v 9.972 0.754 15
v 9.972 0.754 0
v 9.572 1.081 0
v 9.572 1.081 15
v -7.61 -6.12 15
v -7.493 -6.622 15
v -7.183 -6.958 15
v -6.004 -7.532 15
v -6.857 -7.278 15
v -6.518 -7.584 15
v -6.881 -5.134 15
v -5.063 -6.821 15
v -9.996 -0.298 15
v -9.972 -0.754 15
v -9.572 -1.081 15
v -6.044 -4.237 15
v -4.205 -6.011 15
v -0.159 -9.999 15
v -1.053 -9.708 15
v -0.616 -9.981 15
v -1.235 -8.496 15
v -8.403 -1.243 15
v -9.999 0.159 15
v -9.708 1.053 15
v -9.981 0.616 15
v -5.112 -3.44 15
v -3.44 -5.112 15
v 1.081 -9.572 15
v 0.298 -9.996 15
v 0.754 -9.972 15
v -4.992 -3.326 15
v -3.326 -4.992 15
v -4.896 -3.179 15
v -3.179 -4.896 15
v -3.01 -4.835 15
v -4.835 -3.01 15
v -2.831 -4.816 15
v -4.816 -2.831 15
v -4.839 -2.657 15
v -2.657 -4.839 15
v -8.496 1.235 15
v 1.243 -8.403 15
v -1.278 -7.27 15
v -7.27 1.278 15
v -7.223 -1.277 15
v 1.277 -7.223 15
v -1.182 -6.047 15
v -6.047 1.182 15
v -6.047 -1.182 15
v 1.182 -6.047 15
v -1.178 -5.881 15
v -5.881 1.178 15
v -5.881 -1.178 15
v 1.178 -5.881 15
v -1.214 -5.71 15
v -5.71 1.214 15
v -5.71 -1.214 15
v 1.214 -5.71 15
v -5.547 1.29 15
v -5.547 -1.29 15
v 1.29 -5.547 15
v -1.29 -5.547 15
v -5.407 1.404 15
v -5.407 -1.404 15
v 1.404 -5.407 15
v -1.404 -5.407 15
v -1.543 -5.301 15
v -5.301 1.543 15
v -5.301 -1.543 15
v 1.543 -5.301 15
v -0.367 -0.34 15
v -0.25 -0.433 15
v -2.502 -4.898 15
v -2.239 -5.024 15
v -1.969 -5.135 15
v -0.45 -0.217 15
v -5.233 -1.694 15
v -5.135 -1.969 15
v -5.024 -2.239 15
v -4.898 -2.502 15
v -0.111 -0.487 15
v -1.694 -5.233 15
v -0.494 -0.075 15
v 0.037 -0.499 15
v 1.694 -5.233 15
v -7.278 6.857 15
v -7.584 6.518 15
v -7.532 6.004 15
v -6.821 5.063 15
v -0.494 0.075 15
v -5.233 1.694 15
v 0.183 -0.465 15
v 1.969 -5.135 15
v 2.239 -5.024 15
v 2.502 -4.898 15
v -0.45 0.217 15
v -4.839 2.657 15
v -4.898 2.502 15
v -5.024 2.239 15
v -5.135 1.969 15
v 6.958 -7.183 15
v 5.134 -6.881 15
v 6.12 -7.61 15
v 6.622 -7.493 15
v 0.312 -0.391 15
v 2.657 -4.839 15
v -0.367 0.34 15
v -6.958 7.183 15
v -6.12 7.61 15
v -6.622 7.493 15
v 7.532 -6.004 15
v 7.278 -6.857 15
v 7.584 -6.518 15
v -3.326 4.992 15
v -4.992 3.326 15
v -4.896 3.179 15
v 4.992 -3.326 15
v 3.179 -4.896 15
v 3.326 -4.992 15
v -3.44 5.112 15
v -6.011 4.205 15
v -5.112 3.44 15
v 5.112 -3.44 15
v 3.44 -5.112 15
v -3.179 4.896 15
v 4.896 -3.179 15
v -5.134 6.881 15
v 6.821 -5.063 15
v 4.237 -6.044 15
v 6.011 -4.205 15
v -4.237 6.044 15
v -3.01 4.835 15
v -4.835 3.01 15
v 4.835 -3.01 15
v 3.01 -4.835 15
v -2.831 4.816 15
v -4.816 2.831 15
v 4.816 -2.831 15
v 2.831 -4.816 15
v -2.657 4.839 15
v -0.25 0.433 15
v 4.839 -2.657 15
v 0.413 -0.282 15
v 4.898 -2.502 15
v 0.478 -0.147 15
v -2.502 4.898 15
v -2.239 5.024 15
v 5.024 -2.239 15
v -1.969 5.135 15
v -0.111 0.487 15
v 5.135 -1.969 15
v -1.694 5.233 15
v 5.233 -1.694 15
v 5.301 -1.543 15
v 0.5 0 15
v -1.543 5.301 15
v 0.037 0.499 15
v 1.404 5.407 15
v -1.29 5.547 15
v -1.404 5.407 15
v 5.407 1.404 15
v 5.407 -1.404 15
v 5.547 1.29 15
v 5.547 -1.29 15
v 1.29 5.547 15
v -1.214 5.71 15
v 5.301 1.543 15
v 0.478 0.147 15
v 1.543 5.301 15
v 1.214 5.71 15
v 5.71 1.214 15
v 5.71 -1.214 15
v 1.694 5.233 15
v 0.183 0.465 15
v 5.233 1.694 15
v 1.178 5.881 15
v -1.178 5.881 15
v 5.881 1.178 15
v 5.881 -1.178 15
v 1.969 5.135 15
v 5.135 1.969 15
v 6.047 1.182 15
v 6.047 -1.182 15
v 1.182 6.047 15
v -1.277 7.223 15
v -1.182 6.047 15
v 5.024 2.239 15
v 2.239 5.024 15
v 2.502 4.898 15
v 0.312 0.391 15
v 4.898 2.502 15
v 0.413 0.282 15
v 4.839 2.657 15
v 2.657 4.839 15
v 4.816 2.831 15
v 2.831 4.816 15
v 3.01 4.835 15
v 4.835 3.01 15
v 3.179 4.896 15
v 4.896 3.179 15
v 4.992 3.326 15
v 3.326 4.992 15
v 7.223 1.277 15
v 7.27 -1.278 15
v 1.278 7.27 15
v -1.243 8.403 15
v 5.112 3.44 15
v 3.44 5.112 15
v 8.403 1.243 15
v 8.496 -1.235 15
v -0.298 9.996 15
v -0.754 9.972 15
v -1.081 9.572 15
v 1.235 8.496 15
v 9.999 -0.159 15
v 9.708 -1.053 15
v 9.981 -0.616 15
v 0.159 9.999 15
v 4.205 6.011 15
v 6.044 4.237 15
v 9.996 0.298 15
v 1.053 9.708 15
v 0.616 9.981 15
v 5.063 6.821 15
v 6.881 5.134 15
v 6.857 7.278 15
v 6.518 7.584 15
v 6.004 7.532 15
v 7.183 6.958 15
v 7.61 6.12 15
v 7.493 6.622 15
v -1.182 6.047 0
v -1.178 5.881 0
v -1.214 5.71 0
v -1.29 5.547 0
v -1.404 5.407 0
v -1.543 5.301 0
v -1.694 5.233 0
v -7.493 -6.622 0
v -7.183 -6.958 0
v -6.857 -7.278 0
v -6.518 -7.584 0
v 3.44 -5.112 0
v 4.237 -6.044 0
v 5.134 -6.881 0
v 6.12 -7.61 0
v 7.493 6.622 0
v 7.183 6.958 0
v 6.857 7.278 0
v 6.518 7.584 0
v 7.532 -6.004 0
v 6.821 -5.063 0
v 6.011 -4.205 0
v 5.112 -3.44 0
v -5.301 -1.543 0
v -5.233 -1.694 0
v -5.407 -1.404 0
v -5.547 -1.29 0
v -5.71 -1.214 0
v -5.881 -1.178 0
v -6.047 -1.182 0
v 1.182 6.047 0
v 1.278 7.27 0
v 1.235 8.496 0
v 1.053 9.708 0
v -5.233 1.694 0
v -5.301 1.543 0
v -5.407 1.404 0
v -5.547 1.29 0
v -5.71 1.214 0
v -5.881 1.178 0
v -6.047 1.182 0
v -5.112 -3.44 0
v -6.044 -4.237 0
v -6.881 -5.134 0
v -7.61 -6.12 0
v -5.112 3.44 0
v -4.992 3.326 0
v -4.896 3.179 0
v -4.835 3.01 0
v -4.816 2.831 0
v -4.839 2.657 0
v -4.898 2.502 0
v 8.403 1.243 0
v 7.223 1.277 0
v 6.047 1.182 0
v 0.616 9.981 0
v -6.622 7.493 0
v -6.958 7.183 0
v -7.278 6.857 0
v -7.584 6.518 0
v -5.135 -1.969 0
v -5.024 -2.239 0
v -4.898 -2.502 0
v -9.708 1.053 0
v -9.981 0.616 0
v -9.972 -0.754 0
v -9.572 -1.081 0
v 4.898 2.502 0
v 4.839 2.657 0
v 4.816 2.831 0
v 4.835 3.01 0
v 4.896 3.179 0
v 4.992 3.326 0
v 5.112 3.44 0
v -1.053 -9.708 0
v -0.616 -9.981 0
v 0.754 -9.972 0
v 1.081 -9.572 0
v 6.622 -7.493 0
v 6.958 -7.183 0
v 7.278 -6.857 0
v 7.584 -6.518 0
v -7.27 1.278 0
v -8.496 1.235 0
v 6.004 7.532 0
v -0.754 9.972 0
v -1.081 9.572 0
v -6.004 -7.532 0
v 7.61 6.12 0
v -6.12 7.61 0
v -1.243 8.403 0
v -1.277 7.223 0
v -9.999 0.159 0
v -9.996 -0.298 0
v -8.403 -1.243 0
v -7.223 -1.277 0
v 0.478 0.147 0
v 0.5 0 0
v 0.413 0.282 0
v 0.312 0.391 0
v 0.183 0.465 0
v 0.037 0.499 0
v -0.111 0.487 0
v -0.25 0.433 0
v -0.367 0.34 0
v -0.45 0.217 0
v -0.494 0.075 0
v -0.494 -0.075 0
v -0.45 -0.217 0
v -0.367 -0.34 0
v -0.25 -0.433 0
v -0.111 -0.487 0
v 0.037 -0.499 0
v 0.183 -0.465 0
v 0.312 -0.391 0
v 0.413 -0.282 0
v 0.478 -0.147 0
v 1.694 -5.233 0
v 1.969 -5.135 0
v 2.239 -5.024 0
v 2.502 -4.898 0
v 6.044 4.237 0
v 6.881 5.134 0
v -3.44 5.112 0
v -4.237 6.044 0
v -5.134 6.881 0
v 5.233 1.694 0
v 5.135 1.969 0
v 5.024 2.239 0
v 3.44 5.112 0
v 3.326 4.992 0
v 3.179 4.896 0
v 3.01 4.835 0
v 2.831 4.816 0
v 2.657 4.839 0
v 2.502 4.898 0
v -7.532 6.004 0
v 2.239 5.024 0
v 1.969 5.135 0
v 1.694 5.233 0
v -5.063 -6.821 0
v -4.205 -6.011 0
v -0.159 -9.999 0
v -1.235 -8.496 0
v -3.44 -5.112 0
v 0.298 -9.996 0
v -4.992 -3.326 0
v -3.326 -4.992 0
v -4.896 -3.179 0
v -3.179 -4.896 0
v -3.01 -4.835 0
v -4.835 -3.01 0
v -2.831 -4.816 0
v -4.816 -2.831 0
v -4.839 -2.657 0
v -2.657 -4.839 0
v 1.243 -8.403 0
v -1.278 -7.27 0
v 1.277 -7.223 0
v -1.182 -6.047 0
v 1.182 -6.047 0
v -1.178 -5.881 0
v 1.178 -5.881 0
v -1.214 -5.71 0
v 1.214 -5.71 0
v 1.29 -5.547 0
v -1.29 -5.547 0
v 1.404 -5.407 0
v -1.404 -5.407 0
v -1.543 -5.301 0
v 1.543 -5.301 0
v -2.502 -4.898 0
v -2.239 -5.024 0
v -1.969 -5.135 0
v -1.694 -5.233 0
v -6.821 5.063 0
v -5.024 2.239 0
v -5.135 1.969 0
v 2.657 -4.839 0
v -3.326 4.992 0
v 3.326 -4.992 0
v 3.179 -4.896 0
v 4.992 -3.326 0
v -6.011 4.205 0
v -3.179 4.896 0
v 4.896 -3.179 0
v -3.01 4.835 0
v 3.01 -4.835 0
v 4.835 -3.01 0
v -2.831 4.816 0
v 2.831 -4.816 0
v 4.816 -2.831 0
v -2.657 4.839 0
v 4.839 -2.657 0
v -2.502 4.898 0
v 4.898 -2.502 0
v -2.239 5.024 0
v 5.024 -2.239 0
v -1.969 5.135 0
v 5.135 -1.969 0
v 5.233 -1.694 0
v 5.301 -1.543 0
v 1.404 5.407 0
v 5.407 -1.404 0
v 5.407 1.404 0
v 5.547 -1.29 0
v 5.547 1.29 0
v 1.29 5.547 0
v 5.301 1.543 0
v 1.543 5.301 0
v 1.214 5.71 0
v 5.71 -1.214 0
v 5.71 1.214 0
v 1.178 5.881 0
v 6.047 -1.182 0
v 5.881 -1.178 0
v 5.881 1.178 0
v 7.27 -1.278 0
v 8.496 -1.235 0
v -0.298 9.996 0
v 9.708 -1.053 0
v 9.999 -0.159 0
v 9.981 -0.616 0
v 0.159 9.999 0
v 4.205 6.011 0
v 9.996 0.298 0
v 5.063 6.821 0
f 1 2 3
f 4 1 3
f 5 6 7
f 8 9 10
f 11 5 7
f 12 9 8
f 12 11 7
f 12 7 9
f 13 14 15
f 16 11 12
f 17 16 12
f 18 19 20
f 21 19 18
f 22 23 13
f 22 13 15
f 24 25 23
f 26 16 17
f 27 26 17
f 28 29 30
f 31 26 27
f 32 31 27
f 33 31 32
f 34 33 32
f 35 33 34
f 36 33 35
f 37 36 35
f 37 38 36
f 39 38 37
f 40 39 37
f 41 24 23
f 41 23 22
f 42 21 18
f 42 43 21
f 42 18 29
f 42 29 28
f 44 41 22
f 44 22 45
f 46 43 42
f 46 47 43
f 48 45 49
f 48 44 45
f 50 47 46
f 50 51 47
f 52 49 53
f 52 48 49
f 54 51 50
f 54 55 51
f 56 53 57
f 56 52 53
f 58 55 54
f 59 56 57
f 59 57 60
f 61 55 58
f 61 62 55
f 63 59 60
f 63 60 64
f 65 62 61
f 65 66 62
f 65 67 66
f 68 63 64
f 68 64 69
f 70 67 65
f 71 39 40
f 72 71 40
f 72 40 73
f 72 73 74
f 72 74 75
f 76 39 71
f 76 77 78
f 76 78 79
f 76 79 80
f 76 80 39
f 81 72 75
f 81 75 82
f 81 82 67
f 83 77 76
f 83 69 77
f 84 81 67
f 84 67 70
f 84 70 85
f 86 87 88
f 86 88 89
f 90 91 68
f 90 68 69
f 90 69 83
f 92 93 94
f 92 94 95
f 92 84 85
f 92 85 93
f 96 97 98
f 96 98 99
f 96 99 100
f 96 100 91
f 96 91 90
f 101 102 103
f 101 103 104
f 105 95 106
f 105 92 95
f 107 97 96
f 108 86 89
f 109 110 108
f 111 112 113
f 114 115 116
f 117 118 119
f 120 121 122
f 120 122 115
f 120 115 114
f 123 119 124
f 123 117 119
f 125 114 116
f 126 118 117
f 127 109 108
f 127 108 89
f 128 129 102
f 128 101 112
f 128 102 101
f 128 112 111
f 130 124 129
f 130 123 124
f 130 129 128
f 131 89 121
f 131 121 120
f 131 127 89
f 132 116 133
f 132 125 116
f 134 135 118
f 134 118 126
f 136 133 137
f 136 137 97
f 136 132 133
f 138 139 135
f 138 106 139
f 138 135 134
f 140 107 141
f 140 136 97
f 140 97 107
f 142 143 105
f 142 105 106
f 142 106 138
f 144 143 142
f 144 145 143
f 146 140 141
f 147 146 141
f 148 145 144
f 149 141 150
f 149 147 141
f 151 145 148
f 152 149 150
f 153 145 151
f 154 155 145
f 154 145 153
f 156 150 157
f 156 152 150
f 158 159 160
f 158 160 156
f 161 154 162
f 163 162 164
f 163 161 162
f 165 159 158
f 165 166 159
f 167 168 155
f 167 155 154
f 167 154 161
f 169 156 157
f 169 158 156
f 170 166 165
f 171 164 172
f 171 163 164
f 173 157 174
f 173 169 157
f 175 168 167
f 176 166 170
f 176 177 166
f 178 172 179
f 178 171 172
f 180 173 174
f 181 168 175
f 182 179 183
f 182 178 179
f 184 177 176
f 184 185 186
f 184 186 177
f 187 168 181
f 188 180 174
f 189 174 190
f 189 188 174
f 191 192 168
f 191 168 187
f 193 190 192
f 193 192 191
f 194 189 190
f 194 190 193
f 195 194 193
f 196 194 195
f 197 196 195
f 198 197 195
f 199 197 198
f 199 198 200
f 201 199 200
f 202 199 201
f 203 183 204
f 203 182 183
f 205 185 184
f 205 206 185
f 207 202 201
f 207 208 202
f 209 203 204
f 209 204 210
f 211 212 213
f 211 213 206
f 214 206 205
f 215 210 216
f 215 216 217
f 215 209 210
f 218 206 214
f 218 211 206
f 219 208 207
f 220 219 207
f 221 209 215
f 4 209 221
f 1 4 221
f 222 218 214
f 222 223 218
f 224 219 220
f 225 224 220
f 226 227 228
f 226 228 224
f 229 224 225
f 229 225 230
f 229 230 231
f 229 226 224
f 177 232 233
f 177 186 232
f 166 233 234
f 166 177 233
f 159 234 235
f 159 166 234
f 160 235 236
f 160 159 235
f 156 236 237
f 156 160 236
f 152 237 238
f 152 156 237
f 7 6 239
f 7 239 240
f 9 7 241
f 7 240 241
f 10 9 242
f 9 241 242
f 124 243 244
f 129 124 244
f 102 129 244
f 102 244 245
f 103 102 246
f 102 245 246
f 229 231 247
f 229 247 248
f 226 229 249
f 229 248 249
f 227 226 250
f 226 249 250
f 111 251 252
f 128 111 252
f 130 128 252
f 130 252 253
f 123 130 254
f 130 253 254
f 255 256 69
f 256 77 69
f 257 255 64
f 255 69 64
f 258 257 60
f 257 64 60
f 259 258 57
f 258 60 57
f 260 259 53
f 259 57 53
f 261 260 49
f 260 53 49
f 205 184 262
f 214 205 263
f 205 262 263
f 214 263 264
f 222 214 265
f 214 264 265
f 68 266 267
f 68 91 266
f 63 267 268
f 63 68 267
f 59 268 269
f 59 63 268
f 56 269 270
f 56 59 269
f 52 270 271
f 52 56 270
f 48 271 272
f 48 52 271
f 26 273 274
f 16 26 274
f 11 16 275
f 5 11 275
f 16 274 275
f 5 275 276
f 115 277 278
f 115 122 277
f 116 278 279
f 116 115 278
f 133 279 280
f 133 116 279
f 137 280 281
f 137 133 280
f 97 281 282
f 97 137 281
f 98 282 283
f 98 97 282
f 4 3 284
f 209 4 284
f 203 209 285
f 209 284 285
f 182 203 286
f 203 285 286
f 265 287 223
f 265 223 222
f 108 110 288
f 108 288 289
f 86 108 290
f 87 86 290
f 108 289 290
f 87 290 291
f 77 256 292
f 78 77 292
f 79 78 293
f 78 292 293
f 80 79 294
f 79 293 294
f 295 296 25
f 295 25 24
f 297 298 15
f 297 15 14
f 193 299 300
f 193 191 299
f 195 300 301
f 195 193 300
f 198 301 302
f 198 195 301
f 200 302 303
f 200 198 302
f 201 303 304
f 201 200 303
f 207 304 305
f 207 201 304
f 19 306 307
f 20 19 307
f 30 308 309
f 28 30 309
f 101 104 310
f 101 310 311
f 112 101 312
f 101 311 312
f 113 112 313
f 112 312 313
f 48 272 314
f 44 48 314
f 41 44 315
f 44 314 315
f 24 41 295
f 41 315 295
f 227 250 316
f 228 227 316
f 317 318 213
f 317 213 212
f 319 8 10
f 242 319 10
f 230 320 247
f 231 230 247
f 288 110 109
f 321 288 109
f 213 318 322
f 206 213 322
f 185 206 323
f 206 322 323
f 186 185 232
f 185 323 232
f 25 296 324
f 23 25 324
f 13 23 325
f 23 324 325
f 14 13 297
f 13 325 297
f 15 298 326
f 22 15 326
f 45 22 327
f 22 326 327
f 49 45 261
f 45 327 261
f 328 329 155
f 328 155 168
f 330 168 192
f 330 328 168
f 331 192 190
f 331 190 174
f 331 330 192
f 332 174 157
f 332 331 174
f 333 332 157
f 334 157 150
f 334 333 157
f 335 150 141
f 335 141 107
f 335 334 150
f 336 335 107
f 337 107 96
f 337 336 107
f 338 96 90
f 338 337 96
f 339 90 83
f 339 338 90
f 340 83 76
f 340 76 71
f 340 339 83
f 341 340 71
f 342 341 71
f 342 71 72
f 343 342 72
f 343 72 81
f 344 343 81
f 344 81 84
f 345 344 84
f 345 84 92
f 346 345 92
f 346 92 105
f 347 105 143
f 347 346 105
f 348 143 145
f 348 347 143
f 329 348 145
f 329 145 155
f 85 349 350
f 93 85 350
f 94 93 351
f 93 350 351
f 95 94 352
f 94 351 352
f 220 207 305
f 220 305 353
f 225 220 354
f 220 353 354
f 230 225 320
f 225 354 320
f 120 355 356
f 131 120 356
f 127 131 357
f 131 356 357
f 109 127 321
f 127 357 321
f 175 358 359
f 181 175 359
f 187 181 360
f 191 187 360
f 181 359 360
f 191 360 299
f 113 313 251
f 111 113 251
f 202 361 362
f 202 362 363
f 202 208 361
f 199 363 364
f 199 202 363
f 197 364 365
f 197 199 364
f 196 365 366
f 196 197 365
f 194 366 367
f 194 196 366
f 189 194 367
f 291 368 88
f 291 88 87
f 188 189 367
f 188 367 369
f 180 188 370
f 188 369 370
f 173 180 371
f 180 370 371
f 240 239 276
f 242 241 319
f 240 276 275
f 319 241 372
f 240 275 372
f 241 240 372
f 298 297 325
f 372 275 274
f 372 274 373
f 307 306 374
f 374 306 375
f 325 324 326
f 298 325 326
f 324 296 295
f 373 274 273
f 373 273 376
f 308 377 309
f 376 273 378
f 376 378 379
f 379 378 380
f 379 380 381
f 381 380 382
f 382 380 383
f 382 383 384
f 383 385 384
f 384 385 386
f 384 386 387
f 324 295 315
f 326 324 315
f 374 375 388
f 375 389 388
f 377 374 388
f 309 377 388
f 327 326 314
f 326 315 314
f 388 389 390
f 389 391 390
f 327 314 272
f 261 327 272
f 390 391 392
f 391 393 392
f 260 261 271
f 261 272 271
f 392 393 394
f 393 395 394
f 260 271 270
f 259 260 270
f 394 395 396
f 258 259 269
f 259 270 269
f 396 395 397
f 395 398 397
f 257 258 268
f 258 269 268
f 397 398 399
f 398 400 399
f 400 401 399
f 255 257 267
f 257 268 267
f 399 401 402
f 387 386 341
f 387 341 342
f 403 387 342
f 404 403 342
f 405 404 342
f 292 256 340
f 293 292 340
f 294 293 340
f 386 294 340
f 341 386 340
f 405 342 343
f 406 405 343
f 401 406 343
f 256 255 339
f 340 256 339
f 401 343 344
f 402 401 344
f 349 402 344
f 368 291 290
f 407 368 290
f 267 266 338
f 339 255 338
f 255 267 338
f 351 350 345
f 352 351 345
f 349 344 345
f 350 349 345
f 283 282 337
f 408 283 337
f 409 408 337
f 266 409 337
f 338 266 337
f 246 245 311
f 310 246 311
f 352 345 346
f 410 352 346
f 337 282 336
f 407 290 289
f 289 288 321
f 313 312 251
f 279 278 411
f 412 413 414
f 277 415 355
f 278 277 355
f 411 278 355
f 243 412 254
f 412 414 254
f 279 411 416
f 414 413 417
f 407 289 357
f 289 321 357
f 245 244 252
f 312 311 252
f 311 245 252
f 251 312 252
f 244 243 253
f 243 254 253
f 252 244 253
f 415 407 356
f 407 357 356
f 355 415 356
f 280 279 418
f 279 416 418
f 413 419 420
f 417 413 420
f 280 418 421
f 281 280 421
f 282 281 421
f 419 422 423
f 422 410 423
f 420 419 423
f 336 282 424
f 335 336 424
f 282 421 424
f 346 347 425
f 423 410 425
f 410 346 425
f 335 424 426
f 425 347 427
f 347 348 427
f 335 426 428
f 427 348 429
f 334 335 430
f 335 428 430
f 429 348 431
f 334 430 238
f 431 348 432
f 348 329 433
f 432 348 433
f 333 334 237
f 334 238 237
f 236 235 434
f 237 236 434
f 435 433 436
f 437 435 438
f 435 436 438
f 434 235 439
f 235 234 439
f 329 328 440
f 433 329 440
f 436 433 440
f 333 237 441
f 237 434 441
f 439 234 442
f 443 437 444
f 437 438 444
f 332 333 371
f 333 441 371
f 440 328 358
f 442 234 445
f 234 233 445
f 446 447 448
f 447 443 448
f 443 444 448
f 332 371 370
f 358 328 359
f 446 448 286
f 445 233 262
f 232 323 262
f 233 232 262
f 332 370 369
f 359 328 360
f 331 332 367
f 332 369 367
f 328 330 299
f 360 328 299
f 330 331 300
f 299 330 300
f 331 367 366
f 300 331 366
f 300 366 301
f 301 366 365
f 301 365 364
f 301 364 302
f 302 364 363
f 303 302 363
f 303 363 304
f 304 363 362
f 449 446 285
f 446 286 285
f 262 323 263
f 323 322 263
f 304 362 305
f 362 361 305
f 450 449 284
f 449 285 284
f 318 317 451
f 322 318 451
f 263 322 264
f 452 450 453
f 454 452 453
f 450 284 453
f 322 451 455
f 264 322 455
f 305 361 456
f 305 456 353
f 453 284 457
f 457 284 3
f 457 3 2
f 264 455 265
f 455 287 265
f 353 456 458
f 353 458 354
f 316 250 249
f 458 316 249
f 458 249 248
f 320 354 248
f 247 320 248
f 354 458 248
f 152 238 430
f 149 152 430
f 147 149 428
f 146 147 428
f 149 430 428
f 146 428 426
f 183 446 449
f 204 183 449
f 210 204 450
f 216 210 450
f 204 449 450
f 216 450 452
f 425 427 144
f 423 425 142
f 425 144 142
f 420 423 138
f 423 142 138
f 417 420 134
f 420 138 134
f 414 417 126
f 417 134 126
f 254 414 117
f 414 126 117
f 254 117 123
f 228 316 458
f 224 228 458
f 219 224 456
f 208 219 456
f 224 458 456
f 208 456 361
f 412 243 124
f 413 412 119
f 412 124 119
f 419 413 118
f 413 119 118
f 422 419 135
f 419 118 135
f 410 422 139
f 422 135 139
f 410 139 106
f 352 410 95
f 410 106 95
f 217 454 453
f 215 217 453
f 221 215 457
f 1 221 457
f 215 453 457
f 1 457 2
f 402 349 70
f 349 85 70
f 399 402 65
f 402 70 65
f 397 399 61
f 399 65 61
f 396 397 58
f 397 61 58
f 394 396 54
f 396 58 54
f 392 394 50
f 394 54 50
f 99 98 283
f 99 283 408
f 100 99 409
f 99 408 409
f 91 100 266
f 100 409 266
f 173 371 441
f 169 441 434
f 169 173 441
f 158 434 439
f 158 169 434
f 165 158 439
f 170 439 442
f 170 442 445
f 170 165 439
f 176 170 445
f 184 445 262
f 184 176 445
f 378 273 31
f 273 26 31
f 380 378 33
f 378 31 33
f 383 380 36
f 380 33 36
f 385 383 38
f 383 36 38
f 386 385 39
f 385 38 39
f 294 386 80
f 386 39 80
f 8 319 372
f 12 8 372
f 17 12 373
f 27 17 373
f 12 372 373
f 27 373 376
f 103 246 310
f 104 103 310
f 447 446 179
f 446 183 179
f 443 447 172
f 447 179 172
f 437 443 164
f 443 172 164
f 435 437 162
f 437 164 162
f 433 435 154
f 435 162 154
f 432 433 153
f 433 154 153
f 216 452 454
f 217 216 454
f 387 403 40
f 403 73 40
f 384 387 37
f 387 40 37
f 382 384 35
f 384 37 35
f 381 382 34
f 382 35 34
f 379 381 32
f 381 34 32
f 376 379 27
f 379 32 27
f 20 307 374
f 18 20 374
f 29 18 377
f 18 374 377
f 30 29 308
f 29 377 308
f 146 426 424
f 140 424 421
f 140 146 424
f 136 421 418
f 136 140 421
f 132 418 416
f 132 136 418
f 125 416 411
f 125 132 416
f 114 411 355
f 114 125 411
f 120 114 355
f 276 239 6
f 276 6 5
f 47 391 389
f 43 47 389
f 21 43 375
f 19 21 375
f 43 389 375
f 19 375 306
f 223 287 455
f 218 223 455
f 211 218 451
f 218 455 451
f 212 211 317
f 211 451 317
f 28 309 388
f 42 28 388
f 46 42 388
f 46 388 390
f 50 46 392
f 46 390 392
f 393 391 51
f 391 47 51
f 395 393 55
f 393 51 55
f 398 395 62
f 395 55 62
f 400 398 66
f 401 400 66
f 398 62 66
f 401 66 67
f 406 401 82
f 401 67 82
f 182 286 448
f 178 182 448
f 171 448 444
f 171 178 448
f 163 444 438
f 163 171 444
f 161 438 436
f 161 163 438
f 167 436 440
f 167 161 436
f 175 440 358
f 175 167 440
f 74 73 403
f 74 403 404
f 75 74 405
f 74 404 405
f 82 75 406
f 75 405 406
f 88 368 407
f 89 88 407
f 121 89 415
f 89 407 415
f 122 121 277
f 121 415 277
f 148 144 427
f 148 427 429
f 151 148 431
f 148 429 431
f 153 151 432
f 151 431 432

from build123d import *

# Parameters (mm, degrees)
SKETCH1_R           = 0.5
BOSS_EXTRUDE1_DEPTH = 15
FILLET1_R           = 0.75


with BuildPart() as part:
    # Sketch1 → Boss-Extrude1 (new body)
    with BuildSketch(Plane.XY):
        with BuildLine():
            ThreePointArc((9.949874371, -1), (10, 0), (9.949874371, 1))
            ThreePointArc((9.949874371, 1), (7.675986954, 1.279279491), (5.394319042, 1.072996771))
            ThreePointArc((5.394319042, 1.072996771), (5.081337429, 2.104758878), (4.573082868, 3.055636282))
            ThreePointArc((4.573082868, 3.055636282), (6.332329631, 4.523155224), (7.742730421, 6.328516859))
            ThreePointArc((7.742730421, 6.328516859), (7.071067812, 7.071067812), (6.328516859, 7.742730421))
            ThreePointArc((6.328516859, 7.742730421), (4.523155224, 6.332329631), (3.055636282, 4.573082868))
            ThreePointArc((3.055636282, 4.573082868), (2.104758878, 5.081337429), (1.072996771, 5.394319042))
            ThreePointArc((1.072996771, 5.394319042), (1.279279491, 7.675986954), (1, 9.949874371))
            ThreePointArc((1, 9.949874371), (0, 10), (-1, 9.949874371))
            ThreePointArc((-1, 9.949874371), (-1.279279491, 7.675986954), (-1.072996771, 5.394319042))
            ThreePointArc((-1.072996771, 5.394319042), (-2.104758878, 5.081337429), (-3.055636282, 4.573082868))
            ThreePointArc((-3.055636282, 4.573082868), (-4.523155224, 6.332329631), (-6.328516859, 7.742730421))
            ThreePointArc((-6.328516859, 7.742730421), (-7.071067812, 7.071067812), (-7.742730421, 6.328516859))
            ThreePointArc((-7.742730421, 6.328516859), (-6.332329631, 4.523155224), (-4.573082868, 3.055636282))
            ThreePointArc((-4.573082868, 3.055636282), (-5.081337429, 2.104758878), (-5.394319042, 1.072996771))
            ThreePointArc((-5.394319042, 1.072996771), (-7.675986954, 1.279279491), (-9.949874371, 1))
            ThreePointArc((-9.949874371, 1), (-10, 0), (-9.949874371, -1))
            ThreePointArc((-9.949874371, -1), (-7.675986954, -1.279279491), (-5.394319042, -1.072996771))
            ThreePointArc((-5.394319042, -1.072996771), (-5.081337429, -2.104758878), (-4.573082868, -3.055636282))
            ThreePointArc((-4.573082868, -3.055636282), (-6.332329631, -4.523155224), (-7.742730421, -6.328516859))
            ThreePointArc((-7.742730421, -6.328516859), (-7.071067812, -7.071067812), (-6.328516859, -7.742730421))
            ThreePointArc((-6.328516859, -7.742730421), (-4.523155224, -6.332329631), (-3.055636282, -4.573082868))
            ThreePointArc((-3.055636282, -4.573082868), (-2.104758878, -5.081337429), (-1.072996771, -5.394319042))
            ThreePointArc((-1.072996771, -5.394319042), (-1.279279491, -7.675986954), (-1, -9.949874371))
            ThreePointArc((-1, -9.949874371), (0, -10), (1, -9.949874371))
            ThreePointArc((1, -9.949874371), (1.279279491, -7.675986954), (1.072996771, -5.394319042))
            ThreePointArc((1.072996771, -5.394319042), (2.104758878, -5.081337429), (3.055636282, -4.573082868))
            ThreePointArc((3.055636282, -4.573082868), (4.523155224, -6.332329631), (6.328516859, -7.742730421))
            ThreePointArc((6.328516859, -7.742730421), (7.071067812, -7.071067812), (7.742730421, -6.328516859))
            ThreePointArc((7.742730421, -6.328516859), (6.332329631, -4.523155224), (4.573082868, -3.055636282))
            ThreePointArc((4.573082868, -3.055636282), (5.081337429, -2.104758878), (5.394319042, -1.072996771))
            ThreePointArc((5.394319042, -1.072996771), (7.675986954, -1.279279491), (9.949874371, -1))
        make_face()
        Circle(SKETCH1_R, mode=Mode.SUBTRACT)
    extrude(amount=BOSS_EXTRUDE1_DEPTH)

    # Fillet1
    fillet1_edges = [part.edges().sort_by_distance(p)[0] for p in [
        (-3.055636282, 4.573082868, 7.5),
        (-1.072996771, 5.394319042, 7.5),
        (1.072996771, 5.394319042, 7.5),
        (3.055636282, 4.573082868, 7.5),
        (4.573082868, 3.055636282, 7.5),
        (5.394319042, 1.072996771, 7.5),
        (5.394319042, -1.072996771, 7.5),
        (4.573082868, -3.055636282, 7.5),
        (3.055636282, -4.573082868, 7.5),
        (1.072996771, -5.394319042, 7.5),
        (-1.072996771, -5.394319042, 7.5),
        (-3.055636282, -4.573082868, 7.5),
        (-4.573082868, -3.055636282, 7.5),
        (-5.394319042, -1.072996771, 7.5),
        (-5.394319042, 1.072996771, 7.5),
        (-4.573082868, 3.055636282, 7.5),
    ]]
    fillet(fillet1_edges, radius=FILLET1_R)

    # Chamfer1
    # the kernel refuses this chamfer: 0.400753043, 0.25 mm, written as the material it takes off along each edge
    with BuildSketch(Plane(origin=(-1, 9.949874371, -1.002654566), x_dir=(-0.20895056645283513, -0.9779262041580844, 0), z_dir=(0, 0, 1)), Plane(origin=(-6.328516859, -7.742730421, -1.002654566), x_dir=(0.8392486129317811, 0.543747887988617, 0), z_dir=(0, 0, 1)), Plane(origin=(-9.949874371, -1, -1.002654566), x_dir=(0.9779262041580814, -0.20895056645284896, 0), z_dir=(0, 0, 1)), Plane(origin=(-7.742730421, 6.328516859, -1.002654566), x_dir=(0.5437478879886213, -0.8392486129317783, 0), z_dir=(0, 0, 1))) as chamfer1_piece_1:
        with BuildLine():
            Line((0.38673743, 0), (-0.072587978, 0.236060888))
            ThreePointArc((-0.072587978, 0.236060888), (-0.038665519, 0.123154019), (0, 0))
            ThreePointArc((0, 0), (0.200496166, -0.001727616), (0.38673743, 0))
        make_face()
    extrude(amount=17.005309131, mode=Mode.SUBTRACT)
    with BuildSketch(Plane(origin=(1, 9.949874371, -1.000017097), x_dir=(-0.9967308645828112, 0.08079346253256948, 0), z_dir=(0, 0, 1)), Plane(origin=(-7.742730421, -6.328516859, -1.000017097), x_dir=(0.6476655481321507, -0.761924758596727, 0), z_dir=(0, 0, 1)), Plane(origin=(-9.949874371, 1, -1.000017097), x_dir=(-0.0807934625325496, -0.9967308645828128, 0), z_dir=(0, 0, 1)), Plane(origin=(-6.328516859, 7.742730421, -1.000017097), x_dir=(-0.7619247585967629, -0.6476655481321085, 0), z_dir=(0, 0, 1))) as chamfer1_piece_2:
        with BuildLine():
            Line((0.385692125, 0), (-0.072539186, 0.236306293))
            ThreePointArc((-0.072539186, 0.236306293), (-0.038587076, 0.123299359), (0, 0))
            ThreePointArc((0, 0), (0.199968385, -0.001857117), (0.385692125, 0))
        make_face()
    extrude(amount=17.000034195, mode=Mode.SUBTRACT)
    with BuildSketch(Plane(origin=(6.328516859, 7.742730421, -1.002654566), x_dir=(0.7663992656604338, -0.6423645114692652, 0), z_dir=(0, 0, 1)), Plane(origin=(9.949874371, 1, -1.002654566), x_dir=(0.08770581579133363, -0.9961464198983886, 0), z_dir=(0, 0, 1)), Plane(origin=(7.742730421, -6.328516859, -1.002654566), x_dir=(-0.6423645114693267, -0.7663992656603822, 0), z_dir=(0, 0, 1)), Plane(origin=(1, -9.949874371, -1.002654566), x_dir=(-0.9961464198983921, -0.08770581579129355, 0), z_dir=(0, 0, 1))) as chamfer1_piece_3:
        with BuildLine():
            Line((0.246969142, 0), (-0.113667999, -0.36965582))
            ThreePointArc((-0.113667999, -0.36965582), (-0.060580175, -0.19113278), (0, 0))
            ThreePointArc((0, 0), (0.129078874, 0.000760886), (0.246969142, 0))
        make_face()
    extrude(amount=17.005309131, mode=Mode.SUBTRACT)
    with BuildSketch(Plane(origin=(7.742730421, 6.328516859, -1.000017097), x_dir=(-0.538317928460667, -0.8427418394133617, 0), z_dir=(0, 0, 1)), Plane(origin=(9.949874371, -1, -1.000017097), x_dir=(-0.9765567270876431, -0.215260211789988, 0), z_dir=(0, 0, 1)), Plane(origin=(6.328516859, -7.742730421, -1.000017097), x_dir=(-0.8427418394133621, 0.5383179284606663, 0), z_dir=(0, 0, 1)), Plane(origin=(-1, -9.949874371, -1.000017097), x_dir=(-0.21526021179000385, 0.9765567270876397, 0), z_dir=(0, 0, 1))) as chamfer1_piece_4:
        with BuildLine():
            Line((0.247189396, 0), (-0.113183628, -0.368711108))
            ThreePointArc((-0.113183628, -0.368711108), (-0.060457254, -0.190619318), (0, 0))
            ThreePointArc((0, 0), (0.129194415, 0.000705264), (0.247189396, 0))
        make_face()
    extrude(amount=17.000034195, mode=Mode.SUBTRACT)


solid = part.part
